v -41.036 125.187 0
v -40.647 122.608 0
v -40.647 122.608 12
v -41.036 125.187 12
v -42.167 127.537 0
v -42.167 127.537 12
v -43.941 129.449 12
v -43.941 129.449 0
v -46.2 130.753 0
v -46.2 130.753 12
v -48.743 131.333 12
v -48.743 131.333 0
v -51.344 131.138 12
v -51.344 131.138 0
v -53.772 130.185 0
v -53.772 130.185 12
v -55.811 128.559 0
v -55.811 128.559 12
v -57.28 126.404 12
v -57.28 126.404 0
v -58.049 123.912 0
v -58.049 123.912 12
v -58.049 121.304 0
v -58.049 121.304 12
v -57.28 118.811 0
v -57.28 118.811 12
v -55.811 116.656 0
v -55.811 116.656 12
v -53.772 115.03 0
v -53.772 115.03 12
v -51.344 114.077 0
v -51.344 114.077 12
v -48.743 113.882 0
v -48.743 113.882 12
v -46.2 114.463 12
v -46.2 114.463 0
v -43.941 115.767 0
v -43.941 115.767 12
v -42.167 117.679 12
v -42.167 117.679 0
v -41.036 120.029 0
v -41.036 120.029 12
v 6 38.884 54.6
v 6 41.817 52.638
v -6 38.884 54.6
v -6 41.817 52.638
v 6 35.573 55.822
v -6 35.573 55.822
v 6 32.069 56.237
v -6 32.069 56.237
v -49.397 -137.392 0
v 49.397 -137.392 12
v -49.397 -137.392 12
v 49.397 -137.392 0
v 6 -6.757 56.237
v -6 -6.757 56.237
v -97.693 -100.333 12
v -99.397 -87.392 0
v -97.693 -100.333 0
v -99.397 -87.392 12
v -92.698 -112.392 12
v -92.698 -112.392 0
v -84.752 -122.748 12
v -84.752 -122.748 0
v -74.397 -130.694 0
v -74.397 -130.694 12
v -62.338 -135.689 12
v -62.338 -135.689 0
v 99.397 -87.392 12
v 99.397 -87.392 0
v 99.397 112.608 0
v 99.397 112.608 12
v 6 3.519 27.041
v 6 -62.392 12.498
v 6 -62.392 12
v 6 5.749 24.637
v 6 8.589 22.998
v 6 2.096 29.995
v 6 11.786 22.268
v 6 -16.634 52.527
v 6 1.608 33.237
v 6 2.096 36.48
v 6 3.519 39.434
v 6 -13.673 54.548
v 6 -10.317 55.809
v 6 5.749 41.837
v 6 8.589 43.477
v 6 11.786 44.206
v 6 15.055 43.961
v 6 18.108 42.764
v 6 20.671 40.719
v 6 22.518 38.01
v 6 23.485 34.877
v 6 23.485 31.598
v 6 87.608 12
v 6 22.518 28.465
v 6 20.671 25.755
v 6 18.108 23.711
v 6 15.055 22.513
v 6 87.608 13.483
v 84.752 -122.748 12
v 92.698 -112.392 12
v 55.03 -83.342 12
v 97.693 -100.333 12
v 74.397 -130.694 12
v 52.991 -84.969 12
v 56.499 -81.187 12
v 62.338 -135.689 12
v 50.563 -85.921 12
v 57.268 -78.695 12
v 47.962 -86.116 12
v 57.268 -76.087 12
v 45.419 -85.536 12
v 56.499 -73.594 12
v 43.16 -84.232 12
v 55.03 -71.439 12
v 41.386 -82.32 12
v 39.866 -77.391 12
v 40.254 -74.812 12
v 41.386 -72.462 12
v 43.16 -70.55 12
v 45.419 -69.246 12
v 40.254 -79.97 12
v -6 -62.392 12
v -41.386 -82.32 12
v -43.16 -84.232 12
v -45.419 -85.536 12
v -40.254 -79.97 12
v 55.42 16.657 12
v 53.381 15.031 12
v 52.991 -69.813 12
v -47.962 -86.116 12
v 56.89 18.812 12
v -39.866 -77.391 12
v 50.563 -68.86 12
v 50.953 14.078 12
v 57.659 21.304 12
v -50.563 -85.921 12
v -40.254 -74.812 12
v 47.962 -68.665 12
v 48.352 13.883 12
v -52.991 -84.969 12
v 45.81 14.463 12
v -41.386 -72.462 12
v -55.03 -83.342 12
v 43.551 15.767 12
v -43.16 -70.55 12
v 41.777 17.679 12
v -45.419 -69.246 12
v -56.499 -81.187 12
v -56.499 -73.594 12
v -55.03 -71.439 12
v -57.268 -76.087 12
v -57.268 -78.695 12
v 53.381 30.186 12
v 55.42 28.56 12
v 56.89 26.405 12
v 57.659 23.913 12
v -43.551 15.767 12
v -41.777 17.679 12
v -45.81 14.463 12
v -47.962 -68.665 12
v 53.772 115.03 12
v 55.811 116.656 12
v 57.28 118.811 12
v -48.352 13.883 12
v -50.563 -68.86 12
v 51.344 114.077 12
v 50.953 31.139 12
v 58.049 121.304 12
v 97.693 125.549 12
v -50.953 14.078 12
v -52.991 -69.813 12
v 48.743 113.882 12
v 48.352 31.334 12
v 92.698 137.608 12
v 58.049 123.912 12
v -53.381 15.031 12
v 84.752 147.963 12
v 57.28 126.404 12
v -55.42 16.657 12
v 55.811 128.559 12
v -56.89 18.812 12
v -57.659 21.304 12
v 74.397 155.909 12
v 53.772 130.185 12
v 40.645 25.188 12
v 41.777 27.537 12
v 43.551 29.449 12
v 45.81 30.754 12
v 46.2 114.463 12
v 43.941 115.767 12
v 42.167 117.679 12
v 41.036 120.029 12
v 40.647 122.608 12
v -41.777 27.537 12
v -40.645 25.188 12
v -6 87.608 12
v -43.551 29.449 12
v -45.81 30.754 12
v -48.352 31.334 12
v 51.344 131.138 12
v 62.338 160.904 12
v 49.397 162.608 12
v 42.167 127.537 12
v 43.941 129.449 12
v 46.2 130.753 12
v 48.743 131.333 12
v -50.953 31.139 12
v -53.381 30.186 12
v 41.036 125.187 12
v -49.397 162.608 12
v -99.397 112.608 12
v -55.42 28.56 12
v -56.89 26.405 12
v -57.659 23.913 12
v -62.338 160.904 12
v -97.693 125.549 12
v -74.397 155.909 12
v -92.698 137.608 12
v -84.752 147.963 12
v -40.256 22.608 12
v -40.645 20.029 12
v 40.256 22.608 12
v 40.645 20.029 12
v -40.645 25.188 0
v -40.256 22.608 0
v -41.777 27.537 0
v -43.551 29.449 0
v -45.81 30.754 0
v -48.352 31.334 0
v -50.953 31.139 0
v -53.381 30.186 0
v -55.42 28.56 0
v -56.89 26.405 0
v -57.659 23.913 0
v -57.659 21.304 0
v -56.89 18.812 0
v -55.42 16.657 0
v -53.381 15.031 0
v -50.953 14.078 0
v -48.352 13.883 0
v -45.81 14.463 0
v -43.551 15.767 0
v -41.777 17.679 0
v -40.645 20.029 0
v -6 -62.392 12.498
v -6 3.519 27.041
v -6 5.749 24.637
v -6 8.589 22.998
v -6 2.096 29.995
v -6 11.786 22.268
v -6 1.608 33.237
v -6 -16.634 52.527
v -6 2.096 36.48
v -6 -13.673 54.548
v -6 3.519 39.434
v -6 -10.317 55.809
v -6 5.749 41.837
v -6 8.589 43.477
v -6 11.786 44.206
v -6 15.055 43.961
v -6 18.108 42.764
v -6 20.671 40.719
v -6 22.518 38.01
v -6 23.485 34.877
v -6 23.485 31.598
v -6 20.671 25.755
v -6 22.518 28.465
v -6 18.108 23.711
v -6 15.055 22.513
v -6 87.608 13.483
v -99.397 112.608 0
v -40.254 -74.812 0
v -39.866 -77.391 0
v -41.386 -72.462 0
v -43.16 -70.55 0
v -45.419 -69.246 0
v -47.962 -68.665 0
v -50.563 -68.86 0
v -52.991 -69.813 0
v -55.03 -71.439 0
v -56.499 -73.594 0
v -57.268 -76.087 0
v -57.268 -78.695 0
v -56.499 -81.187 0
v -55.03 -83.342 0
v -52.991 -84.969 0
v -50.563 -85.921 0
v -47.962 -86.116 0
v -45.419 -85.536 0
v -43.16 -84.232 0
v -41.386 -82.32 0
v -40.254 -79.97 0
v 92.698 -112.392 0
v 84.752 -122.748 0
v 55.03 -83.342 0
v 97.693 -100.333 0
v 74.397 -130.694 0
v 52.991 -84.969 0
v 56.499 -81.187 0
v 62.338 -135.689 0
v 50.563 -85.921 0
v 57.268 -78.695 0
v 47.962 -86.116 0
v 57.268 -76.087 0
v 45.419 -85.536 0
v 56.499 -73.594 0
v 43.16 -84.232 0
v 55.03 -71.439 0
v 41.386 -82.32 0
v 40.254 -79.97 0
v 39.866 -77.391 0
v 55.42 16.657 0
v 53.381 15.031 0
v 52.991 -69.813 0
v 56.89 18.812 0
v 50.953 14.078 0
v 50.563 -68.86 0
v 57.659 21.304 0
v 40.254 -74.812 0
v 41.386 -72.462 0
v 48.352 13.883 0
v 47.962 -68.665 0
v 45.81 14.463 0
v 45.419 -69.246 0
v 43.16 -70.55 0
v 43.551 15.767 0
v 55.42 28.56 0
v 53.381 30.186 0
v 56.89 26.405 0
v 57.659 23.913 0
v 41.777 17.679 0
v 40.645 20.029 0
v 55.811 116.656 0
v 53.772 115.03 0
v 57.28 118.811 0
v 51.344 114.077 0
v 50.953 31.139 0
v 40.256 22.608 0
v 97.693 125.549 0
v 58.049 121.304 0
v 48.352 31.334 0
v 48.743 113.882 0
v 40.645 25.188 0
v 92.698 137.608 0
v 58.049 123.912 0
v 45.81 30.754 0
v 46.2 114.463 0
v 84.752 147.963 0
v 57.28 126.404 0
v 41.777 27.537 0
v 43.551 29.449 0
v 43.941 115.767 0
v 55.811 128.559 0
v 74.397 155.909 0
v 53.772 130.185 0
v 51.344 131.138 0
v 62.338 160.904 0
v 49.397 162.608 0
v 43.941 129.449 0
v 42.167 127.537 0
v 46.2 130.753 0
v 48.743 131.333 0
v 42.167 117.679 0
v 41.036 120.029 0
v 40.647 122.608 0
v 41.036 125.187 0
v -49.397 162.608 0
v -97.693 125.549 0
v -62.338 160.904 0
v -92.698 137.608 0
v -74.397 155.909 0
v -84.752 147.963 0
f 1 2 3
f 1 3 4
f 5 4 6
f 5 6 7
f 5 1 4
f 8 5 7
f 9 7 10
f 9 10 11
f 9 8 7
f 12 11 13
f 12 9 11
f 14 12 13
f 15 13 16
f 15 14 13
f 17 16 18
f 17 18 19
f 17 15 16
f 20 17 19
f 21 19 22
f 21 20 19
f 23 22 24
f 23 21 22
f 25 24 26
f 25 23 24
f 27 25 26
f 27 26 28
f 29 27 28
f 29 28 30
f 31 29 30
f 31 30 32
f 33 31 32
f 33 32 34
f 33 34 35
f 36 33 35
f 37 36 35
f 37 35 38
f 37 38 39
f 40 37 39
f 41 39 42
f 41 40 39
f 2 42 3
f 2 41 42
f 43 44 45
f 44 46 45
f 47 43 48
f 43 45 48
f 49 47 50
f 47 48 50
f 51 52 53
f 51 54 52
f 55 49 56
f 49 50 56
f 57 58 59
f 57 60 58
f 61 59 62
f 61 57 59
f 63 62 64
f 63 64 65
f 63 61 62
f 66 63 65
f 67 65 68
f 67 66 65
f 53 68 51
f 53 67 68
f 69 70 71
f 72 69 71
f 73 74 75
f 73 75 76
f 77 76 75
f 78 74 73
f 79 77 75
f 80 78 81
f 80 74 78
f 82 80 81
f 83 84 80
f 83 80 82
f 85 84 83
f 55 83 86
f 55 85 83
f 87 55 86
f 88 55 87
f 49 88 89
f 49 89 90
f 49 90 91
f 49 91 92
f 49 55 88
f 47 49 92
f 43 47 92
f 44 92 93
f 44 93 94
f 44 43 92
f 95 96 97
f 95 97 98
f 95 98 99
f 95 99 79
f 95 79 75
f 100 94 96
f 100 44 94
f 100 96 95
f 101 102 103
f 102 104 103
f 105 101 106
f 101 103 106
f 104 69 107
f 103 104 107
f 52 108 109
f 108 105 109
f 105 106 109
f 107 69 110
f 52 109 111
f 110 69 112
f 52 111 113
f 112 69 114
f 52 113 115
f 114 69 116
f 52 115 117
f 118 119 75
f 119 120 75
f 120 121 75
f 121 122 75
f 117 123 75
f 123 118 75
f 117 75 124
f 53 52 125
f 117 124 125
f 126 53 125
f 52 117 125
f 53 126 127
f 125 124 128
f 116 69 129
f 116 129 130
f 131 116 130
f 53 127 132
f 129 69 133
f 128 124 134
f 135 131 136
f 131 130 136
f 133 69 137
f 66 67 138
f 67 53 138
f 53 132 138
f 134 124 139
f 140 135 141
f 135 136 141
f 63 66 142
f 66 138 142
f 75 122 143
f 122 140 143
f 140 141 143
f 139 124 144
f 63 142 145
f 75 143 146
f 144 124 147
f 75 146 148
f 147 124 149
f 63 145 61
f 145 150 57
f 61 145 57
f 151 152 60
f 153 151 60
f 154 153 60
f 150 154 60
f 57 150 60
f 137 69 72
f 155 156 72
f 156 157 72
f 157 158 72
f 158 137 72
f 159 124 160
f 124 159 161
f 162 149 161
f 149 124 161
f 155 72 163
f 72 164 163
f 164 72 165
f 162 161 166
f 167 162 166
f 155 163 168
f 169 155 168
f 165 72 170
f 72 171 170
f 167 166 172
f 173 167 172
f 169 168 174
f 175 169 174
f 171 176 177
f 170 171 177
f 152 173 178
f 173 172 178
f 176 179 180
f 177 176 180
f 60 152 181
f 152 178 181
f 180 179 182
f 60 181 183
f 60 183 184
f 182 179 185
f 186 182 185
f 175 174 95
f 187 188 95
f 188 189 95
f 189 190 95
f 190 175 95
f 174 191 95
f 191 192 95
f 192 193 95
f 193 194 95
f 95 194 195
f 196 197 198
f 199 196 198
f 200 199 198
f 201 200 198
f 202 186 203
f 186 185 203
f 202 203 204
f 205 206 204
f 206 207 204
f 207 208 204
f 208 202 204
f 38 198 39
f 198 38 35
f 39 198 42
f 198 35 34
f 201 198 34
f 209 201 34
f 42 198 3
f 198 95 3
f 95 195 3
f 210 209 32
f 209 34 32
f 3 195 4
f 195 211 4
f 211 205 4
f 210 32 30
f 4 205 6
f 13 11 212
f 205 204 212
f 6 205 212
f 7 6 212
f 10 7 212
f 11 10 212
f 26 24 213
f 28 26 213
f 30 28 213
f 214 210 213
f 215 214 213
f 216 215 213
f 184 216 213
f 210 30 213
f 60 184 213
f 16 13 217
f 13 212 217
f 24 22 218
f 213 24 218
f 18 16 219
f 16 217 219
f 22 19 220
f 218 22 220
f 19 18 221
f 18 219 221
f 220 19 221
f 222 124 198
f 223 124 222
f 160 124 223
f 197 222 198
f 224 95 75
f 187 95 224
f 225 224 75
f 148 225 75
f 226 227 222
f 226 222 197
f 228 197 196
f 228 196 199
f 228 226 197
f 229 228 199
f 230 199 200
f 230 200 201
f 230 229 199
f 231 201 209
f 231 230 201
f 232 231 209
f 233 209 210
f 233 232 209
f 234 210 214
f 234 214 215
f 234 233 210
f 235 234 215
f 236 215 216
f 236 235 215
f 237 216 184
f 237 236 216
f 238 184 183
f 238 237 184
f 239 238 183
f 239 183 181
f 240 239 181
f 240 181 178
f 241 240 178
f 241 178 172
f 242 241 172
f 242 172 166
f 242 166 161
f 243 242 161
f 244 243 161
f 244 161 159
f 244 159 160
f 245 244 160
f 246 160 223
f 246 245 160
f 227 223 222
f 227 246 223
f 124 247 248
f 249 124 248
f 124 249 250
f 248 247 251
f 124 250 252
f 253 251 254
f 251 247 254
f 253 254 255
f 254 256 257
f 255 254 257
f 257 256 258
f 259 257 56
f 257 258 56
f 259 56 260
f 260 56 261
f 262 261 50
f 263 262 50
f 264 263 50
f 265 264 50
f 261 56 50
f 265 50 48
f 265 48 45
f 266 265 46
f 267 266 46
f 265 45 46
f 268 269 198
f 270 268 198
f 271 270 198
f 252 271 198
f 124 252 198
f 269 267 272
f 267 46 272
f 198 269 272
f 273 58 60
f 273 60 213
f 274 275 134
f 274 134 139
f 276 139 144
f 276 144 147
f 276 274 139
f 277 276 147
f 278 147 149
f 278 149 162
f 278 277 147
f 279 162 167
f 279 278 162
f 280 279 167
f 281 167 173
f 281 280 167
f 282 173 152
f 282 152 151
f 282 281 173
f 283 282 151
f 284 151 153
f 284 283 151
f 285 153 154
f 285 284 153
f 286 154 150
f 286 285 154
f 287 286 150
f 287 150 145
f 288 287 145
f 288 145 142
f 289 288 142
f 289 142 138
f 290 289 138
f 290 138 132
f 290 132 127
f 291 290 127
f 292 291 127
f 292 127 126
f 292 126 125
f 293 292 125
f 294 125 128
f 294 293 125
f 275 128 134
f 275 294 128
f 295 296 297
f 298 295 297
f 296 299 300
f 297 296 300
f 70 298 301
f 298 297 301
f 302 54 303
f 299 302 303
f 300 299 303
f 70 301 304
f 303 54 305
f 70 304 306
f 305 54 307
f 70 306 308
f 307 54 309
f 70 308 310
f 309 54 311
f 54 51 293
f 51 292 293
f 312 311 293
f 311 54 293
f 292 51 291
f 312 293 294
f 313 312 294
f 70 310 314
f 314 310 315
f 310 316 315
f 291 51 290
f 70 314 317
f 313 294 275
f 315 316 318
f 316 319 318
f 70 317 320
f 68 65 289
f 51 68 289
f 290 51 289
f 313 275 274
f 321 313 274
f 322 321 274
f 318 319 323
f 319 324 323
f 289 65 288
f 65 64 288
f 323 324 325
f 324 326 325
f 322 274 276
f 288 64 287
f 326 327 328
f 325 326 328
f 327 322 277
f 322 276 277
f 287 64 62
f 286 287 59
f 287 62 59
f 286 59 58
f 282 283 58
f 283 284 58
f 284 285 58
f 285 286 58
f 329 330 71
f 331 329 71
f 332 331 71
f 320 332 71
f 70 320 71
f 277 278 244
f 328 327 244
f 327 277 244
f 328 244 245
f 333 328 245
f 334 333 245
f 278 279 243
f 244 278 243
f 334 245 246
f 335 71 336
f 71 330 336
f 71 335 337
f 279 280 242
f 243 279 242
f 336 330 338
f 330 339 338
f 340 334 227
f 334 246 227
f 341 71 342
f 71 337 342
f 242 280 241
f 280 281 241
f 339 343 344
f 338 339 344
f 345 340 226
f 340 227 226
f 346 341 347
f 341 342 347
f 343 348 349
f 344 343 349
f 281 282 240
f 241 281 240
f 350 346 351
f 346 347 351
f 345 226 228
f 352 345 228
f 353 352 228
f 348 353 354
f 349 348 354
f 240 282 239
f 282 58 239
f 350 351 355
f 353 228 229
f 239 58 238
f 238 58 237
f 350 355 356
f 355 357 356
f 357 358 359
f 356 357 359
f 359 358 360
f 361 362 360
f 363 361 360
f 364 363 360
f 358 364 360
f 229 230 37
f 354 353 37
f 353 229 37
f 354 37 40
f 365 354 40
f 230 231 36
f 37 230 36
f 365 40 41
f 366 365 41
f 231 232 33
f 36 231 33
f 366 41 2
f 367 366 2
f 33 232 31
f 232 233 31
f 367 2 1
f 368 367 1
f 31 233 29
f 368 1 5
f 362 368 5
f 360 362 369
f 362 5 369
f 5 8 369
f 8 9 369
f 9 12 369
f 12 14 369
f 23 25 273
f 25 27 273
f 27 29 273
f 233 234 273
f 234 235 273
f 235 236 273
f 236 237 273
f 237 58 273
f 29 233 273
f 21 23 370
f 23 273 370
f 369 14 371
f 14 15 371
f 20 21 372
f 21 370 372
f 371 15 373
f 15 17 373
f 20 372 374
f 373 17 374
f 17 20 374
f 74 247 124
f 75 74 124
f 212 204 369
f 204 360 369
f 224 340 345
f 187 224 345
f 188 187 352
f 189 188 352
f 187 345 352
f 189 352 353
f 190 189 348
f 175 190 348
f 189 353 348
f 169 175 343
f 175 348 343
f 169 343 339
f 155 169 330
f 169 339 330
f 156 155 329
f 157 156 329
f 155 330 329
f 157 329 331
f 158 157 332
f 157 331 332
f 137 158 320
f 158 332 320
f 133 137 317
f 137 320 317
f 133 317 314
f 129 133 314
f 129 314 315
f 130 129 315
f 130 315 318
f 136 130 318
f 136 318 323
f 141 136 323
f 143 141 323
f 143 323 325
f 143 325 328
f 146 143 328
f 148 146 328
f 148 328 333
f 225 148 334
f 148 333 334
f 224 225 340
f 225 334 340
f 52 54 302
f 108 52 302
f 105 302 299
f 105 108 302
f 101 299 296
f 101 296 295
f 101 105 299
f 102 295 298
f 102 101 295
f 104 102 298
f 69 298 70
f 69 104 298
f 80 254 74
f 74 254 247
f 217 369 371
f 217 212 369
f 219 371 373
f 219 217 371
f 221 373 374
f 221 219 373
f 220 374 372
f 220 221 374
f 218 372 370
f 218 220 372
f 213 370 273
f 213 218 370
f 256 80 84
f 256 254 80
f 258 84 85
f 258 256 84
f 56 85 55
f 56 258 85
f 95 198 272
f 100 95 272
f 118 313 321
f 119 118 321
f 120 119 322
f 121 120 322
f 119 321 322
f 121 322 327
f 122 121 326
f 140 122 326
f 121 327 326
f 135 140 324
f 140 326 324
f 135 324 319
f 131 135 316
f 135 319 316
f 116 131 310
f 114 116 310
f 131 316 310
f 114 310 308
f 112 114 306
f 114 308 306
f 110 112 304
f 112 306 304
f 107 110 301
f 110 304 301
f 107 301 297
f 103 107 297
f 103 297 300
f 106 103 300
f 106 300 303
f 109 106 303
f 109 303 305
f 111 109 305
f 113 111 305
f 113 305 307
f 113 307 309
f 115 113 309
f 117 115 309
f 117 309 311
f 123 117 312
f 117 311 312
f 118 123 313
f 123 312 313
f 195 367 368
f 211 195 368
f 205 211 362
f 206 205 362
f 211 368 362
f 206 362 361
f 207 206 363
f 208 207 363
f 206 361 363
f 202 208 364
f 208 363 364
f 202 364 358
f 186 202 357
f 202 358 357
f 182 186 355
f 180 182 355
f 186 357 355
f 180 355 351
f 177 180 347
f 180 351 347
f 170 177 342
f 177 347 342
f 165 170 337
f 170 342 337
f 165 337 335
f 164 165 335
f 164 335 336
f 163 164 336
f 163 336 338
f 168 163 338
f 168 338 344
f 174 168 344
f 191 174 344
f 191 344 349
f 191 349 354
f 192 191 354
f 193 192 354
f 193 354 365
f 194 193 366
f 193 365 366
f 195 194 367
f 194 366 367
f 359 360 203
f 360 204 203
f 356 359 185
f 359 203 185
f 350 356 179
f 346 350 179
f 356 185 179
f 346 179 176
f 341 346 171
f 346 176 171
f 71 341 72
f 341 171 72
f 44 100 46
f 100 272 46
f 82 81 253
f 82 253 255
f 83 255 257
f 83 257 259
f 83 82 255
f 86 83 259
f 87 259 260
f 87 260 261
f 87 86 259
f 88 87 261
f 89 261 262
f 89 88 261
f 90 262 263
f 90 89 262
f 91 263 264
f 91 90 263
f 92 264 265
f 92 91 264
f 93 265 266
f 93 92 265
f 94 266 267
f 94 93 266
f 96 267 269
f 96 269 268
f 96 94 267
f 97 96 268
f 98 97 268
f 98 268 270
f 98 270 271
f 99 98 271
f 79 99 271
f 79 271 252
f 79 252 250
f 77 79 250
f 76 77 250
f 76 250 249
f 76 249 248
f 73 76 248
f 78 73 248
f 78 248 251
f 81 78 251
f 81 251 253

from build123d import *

# Parameters (mm, degrees)
F1_W     = 99.3970142677
F1_H     = 300
F1_R     = 8.75
F2_DEPTH = 12
F4_DEPTH = 6
F6_D     = 22
F8_R     = 50
F9_R     = 15


with BuildPart() as f2:
    # F1 (on face) → F2 (new body)
    with BuildSketch(Plane.XY):
        with Locations((-49.6985071339, 12.607654488)):
            Rectangle(F1_W, F1_H)
        with Locations((-48.6155549591, -77.3908188095)):
            Circle(F1_R, mode=Mode.SUBTRACT)
        with Locations((-49.0062846134, 22.6084178392)):
            Circle(F1_R, mode=Mode.SUBTRACT)
        with Locations((-49.3970142677, 122.607654488)):
            Circle(F1_R, mode=Mode.SUBTRACT)
    extrude(amount=F2_DEPTH)

    # F3 (on Right) → F4 (join)
    with BuildSketch(Plane.YZ):
        Polygon((-62.392345512, 12.4983141385), (-62.392345512, 0), (87.607654488, 0), (87.607654488, 13.4828369309), (37.607654488, 56.2372539129), (-12.392345512, 56.2372539129), align=None)
    extrude(amount=-F4_DEPTH)

    # F6 (through all)
    with Locations(Plane.YZ):
        with Locations((12.607654488, 33.2372539129)):
            Hole(F6_D / 2)

    # F7: F2 across face


with BuildPart() as f2_1:
    add(f2.part)
    add(f2.part.mirror(Plane(origin=(0, 12.7942838573, 18.839447443), x_dir=(0, 1, 0), z_dir=(1, 0, 0))))

    # F8
    f8_edges = [f2_1.edges().sort_by_distance(p)[0] for p in [
        (-99.397014, 162.607654, 6),
        (99.397014, 162.607654, 6),
        (99.397014, -137.392346, 6),
        (-99.397014, -137.392346, 6),
    ]]
    fillet(f8_edges, radius=F8_R)

    # F9
    f9_edges = [f2_1.edges().sort_by_distance(p)[0] for p in [
        (0, 37.607654, 56.237254),
        (0, -12.392346, 56.237254),
    ]]
    fillet(f9_edges, radius=F9_R)


solid = f2_1.part
